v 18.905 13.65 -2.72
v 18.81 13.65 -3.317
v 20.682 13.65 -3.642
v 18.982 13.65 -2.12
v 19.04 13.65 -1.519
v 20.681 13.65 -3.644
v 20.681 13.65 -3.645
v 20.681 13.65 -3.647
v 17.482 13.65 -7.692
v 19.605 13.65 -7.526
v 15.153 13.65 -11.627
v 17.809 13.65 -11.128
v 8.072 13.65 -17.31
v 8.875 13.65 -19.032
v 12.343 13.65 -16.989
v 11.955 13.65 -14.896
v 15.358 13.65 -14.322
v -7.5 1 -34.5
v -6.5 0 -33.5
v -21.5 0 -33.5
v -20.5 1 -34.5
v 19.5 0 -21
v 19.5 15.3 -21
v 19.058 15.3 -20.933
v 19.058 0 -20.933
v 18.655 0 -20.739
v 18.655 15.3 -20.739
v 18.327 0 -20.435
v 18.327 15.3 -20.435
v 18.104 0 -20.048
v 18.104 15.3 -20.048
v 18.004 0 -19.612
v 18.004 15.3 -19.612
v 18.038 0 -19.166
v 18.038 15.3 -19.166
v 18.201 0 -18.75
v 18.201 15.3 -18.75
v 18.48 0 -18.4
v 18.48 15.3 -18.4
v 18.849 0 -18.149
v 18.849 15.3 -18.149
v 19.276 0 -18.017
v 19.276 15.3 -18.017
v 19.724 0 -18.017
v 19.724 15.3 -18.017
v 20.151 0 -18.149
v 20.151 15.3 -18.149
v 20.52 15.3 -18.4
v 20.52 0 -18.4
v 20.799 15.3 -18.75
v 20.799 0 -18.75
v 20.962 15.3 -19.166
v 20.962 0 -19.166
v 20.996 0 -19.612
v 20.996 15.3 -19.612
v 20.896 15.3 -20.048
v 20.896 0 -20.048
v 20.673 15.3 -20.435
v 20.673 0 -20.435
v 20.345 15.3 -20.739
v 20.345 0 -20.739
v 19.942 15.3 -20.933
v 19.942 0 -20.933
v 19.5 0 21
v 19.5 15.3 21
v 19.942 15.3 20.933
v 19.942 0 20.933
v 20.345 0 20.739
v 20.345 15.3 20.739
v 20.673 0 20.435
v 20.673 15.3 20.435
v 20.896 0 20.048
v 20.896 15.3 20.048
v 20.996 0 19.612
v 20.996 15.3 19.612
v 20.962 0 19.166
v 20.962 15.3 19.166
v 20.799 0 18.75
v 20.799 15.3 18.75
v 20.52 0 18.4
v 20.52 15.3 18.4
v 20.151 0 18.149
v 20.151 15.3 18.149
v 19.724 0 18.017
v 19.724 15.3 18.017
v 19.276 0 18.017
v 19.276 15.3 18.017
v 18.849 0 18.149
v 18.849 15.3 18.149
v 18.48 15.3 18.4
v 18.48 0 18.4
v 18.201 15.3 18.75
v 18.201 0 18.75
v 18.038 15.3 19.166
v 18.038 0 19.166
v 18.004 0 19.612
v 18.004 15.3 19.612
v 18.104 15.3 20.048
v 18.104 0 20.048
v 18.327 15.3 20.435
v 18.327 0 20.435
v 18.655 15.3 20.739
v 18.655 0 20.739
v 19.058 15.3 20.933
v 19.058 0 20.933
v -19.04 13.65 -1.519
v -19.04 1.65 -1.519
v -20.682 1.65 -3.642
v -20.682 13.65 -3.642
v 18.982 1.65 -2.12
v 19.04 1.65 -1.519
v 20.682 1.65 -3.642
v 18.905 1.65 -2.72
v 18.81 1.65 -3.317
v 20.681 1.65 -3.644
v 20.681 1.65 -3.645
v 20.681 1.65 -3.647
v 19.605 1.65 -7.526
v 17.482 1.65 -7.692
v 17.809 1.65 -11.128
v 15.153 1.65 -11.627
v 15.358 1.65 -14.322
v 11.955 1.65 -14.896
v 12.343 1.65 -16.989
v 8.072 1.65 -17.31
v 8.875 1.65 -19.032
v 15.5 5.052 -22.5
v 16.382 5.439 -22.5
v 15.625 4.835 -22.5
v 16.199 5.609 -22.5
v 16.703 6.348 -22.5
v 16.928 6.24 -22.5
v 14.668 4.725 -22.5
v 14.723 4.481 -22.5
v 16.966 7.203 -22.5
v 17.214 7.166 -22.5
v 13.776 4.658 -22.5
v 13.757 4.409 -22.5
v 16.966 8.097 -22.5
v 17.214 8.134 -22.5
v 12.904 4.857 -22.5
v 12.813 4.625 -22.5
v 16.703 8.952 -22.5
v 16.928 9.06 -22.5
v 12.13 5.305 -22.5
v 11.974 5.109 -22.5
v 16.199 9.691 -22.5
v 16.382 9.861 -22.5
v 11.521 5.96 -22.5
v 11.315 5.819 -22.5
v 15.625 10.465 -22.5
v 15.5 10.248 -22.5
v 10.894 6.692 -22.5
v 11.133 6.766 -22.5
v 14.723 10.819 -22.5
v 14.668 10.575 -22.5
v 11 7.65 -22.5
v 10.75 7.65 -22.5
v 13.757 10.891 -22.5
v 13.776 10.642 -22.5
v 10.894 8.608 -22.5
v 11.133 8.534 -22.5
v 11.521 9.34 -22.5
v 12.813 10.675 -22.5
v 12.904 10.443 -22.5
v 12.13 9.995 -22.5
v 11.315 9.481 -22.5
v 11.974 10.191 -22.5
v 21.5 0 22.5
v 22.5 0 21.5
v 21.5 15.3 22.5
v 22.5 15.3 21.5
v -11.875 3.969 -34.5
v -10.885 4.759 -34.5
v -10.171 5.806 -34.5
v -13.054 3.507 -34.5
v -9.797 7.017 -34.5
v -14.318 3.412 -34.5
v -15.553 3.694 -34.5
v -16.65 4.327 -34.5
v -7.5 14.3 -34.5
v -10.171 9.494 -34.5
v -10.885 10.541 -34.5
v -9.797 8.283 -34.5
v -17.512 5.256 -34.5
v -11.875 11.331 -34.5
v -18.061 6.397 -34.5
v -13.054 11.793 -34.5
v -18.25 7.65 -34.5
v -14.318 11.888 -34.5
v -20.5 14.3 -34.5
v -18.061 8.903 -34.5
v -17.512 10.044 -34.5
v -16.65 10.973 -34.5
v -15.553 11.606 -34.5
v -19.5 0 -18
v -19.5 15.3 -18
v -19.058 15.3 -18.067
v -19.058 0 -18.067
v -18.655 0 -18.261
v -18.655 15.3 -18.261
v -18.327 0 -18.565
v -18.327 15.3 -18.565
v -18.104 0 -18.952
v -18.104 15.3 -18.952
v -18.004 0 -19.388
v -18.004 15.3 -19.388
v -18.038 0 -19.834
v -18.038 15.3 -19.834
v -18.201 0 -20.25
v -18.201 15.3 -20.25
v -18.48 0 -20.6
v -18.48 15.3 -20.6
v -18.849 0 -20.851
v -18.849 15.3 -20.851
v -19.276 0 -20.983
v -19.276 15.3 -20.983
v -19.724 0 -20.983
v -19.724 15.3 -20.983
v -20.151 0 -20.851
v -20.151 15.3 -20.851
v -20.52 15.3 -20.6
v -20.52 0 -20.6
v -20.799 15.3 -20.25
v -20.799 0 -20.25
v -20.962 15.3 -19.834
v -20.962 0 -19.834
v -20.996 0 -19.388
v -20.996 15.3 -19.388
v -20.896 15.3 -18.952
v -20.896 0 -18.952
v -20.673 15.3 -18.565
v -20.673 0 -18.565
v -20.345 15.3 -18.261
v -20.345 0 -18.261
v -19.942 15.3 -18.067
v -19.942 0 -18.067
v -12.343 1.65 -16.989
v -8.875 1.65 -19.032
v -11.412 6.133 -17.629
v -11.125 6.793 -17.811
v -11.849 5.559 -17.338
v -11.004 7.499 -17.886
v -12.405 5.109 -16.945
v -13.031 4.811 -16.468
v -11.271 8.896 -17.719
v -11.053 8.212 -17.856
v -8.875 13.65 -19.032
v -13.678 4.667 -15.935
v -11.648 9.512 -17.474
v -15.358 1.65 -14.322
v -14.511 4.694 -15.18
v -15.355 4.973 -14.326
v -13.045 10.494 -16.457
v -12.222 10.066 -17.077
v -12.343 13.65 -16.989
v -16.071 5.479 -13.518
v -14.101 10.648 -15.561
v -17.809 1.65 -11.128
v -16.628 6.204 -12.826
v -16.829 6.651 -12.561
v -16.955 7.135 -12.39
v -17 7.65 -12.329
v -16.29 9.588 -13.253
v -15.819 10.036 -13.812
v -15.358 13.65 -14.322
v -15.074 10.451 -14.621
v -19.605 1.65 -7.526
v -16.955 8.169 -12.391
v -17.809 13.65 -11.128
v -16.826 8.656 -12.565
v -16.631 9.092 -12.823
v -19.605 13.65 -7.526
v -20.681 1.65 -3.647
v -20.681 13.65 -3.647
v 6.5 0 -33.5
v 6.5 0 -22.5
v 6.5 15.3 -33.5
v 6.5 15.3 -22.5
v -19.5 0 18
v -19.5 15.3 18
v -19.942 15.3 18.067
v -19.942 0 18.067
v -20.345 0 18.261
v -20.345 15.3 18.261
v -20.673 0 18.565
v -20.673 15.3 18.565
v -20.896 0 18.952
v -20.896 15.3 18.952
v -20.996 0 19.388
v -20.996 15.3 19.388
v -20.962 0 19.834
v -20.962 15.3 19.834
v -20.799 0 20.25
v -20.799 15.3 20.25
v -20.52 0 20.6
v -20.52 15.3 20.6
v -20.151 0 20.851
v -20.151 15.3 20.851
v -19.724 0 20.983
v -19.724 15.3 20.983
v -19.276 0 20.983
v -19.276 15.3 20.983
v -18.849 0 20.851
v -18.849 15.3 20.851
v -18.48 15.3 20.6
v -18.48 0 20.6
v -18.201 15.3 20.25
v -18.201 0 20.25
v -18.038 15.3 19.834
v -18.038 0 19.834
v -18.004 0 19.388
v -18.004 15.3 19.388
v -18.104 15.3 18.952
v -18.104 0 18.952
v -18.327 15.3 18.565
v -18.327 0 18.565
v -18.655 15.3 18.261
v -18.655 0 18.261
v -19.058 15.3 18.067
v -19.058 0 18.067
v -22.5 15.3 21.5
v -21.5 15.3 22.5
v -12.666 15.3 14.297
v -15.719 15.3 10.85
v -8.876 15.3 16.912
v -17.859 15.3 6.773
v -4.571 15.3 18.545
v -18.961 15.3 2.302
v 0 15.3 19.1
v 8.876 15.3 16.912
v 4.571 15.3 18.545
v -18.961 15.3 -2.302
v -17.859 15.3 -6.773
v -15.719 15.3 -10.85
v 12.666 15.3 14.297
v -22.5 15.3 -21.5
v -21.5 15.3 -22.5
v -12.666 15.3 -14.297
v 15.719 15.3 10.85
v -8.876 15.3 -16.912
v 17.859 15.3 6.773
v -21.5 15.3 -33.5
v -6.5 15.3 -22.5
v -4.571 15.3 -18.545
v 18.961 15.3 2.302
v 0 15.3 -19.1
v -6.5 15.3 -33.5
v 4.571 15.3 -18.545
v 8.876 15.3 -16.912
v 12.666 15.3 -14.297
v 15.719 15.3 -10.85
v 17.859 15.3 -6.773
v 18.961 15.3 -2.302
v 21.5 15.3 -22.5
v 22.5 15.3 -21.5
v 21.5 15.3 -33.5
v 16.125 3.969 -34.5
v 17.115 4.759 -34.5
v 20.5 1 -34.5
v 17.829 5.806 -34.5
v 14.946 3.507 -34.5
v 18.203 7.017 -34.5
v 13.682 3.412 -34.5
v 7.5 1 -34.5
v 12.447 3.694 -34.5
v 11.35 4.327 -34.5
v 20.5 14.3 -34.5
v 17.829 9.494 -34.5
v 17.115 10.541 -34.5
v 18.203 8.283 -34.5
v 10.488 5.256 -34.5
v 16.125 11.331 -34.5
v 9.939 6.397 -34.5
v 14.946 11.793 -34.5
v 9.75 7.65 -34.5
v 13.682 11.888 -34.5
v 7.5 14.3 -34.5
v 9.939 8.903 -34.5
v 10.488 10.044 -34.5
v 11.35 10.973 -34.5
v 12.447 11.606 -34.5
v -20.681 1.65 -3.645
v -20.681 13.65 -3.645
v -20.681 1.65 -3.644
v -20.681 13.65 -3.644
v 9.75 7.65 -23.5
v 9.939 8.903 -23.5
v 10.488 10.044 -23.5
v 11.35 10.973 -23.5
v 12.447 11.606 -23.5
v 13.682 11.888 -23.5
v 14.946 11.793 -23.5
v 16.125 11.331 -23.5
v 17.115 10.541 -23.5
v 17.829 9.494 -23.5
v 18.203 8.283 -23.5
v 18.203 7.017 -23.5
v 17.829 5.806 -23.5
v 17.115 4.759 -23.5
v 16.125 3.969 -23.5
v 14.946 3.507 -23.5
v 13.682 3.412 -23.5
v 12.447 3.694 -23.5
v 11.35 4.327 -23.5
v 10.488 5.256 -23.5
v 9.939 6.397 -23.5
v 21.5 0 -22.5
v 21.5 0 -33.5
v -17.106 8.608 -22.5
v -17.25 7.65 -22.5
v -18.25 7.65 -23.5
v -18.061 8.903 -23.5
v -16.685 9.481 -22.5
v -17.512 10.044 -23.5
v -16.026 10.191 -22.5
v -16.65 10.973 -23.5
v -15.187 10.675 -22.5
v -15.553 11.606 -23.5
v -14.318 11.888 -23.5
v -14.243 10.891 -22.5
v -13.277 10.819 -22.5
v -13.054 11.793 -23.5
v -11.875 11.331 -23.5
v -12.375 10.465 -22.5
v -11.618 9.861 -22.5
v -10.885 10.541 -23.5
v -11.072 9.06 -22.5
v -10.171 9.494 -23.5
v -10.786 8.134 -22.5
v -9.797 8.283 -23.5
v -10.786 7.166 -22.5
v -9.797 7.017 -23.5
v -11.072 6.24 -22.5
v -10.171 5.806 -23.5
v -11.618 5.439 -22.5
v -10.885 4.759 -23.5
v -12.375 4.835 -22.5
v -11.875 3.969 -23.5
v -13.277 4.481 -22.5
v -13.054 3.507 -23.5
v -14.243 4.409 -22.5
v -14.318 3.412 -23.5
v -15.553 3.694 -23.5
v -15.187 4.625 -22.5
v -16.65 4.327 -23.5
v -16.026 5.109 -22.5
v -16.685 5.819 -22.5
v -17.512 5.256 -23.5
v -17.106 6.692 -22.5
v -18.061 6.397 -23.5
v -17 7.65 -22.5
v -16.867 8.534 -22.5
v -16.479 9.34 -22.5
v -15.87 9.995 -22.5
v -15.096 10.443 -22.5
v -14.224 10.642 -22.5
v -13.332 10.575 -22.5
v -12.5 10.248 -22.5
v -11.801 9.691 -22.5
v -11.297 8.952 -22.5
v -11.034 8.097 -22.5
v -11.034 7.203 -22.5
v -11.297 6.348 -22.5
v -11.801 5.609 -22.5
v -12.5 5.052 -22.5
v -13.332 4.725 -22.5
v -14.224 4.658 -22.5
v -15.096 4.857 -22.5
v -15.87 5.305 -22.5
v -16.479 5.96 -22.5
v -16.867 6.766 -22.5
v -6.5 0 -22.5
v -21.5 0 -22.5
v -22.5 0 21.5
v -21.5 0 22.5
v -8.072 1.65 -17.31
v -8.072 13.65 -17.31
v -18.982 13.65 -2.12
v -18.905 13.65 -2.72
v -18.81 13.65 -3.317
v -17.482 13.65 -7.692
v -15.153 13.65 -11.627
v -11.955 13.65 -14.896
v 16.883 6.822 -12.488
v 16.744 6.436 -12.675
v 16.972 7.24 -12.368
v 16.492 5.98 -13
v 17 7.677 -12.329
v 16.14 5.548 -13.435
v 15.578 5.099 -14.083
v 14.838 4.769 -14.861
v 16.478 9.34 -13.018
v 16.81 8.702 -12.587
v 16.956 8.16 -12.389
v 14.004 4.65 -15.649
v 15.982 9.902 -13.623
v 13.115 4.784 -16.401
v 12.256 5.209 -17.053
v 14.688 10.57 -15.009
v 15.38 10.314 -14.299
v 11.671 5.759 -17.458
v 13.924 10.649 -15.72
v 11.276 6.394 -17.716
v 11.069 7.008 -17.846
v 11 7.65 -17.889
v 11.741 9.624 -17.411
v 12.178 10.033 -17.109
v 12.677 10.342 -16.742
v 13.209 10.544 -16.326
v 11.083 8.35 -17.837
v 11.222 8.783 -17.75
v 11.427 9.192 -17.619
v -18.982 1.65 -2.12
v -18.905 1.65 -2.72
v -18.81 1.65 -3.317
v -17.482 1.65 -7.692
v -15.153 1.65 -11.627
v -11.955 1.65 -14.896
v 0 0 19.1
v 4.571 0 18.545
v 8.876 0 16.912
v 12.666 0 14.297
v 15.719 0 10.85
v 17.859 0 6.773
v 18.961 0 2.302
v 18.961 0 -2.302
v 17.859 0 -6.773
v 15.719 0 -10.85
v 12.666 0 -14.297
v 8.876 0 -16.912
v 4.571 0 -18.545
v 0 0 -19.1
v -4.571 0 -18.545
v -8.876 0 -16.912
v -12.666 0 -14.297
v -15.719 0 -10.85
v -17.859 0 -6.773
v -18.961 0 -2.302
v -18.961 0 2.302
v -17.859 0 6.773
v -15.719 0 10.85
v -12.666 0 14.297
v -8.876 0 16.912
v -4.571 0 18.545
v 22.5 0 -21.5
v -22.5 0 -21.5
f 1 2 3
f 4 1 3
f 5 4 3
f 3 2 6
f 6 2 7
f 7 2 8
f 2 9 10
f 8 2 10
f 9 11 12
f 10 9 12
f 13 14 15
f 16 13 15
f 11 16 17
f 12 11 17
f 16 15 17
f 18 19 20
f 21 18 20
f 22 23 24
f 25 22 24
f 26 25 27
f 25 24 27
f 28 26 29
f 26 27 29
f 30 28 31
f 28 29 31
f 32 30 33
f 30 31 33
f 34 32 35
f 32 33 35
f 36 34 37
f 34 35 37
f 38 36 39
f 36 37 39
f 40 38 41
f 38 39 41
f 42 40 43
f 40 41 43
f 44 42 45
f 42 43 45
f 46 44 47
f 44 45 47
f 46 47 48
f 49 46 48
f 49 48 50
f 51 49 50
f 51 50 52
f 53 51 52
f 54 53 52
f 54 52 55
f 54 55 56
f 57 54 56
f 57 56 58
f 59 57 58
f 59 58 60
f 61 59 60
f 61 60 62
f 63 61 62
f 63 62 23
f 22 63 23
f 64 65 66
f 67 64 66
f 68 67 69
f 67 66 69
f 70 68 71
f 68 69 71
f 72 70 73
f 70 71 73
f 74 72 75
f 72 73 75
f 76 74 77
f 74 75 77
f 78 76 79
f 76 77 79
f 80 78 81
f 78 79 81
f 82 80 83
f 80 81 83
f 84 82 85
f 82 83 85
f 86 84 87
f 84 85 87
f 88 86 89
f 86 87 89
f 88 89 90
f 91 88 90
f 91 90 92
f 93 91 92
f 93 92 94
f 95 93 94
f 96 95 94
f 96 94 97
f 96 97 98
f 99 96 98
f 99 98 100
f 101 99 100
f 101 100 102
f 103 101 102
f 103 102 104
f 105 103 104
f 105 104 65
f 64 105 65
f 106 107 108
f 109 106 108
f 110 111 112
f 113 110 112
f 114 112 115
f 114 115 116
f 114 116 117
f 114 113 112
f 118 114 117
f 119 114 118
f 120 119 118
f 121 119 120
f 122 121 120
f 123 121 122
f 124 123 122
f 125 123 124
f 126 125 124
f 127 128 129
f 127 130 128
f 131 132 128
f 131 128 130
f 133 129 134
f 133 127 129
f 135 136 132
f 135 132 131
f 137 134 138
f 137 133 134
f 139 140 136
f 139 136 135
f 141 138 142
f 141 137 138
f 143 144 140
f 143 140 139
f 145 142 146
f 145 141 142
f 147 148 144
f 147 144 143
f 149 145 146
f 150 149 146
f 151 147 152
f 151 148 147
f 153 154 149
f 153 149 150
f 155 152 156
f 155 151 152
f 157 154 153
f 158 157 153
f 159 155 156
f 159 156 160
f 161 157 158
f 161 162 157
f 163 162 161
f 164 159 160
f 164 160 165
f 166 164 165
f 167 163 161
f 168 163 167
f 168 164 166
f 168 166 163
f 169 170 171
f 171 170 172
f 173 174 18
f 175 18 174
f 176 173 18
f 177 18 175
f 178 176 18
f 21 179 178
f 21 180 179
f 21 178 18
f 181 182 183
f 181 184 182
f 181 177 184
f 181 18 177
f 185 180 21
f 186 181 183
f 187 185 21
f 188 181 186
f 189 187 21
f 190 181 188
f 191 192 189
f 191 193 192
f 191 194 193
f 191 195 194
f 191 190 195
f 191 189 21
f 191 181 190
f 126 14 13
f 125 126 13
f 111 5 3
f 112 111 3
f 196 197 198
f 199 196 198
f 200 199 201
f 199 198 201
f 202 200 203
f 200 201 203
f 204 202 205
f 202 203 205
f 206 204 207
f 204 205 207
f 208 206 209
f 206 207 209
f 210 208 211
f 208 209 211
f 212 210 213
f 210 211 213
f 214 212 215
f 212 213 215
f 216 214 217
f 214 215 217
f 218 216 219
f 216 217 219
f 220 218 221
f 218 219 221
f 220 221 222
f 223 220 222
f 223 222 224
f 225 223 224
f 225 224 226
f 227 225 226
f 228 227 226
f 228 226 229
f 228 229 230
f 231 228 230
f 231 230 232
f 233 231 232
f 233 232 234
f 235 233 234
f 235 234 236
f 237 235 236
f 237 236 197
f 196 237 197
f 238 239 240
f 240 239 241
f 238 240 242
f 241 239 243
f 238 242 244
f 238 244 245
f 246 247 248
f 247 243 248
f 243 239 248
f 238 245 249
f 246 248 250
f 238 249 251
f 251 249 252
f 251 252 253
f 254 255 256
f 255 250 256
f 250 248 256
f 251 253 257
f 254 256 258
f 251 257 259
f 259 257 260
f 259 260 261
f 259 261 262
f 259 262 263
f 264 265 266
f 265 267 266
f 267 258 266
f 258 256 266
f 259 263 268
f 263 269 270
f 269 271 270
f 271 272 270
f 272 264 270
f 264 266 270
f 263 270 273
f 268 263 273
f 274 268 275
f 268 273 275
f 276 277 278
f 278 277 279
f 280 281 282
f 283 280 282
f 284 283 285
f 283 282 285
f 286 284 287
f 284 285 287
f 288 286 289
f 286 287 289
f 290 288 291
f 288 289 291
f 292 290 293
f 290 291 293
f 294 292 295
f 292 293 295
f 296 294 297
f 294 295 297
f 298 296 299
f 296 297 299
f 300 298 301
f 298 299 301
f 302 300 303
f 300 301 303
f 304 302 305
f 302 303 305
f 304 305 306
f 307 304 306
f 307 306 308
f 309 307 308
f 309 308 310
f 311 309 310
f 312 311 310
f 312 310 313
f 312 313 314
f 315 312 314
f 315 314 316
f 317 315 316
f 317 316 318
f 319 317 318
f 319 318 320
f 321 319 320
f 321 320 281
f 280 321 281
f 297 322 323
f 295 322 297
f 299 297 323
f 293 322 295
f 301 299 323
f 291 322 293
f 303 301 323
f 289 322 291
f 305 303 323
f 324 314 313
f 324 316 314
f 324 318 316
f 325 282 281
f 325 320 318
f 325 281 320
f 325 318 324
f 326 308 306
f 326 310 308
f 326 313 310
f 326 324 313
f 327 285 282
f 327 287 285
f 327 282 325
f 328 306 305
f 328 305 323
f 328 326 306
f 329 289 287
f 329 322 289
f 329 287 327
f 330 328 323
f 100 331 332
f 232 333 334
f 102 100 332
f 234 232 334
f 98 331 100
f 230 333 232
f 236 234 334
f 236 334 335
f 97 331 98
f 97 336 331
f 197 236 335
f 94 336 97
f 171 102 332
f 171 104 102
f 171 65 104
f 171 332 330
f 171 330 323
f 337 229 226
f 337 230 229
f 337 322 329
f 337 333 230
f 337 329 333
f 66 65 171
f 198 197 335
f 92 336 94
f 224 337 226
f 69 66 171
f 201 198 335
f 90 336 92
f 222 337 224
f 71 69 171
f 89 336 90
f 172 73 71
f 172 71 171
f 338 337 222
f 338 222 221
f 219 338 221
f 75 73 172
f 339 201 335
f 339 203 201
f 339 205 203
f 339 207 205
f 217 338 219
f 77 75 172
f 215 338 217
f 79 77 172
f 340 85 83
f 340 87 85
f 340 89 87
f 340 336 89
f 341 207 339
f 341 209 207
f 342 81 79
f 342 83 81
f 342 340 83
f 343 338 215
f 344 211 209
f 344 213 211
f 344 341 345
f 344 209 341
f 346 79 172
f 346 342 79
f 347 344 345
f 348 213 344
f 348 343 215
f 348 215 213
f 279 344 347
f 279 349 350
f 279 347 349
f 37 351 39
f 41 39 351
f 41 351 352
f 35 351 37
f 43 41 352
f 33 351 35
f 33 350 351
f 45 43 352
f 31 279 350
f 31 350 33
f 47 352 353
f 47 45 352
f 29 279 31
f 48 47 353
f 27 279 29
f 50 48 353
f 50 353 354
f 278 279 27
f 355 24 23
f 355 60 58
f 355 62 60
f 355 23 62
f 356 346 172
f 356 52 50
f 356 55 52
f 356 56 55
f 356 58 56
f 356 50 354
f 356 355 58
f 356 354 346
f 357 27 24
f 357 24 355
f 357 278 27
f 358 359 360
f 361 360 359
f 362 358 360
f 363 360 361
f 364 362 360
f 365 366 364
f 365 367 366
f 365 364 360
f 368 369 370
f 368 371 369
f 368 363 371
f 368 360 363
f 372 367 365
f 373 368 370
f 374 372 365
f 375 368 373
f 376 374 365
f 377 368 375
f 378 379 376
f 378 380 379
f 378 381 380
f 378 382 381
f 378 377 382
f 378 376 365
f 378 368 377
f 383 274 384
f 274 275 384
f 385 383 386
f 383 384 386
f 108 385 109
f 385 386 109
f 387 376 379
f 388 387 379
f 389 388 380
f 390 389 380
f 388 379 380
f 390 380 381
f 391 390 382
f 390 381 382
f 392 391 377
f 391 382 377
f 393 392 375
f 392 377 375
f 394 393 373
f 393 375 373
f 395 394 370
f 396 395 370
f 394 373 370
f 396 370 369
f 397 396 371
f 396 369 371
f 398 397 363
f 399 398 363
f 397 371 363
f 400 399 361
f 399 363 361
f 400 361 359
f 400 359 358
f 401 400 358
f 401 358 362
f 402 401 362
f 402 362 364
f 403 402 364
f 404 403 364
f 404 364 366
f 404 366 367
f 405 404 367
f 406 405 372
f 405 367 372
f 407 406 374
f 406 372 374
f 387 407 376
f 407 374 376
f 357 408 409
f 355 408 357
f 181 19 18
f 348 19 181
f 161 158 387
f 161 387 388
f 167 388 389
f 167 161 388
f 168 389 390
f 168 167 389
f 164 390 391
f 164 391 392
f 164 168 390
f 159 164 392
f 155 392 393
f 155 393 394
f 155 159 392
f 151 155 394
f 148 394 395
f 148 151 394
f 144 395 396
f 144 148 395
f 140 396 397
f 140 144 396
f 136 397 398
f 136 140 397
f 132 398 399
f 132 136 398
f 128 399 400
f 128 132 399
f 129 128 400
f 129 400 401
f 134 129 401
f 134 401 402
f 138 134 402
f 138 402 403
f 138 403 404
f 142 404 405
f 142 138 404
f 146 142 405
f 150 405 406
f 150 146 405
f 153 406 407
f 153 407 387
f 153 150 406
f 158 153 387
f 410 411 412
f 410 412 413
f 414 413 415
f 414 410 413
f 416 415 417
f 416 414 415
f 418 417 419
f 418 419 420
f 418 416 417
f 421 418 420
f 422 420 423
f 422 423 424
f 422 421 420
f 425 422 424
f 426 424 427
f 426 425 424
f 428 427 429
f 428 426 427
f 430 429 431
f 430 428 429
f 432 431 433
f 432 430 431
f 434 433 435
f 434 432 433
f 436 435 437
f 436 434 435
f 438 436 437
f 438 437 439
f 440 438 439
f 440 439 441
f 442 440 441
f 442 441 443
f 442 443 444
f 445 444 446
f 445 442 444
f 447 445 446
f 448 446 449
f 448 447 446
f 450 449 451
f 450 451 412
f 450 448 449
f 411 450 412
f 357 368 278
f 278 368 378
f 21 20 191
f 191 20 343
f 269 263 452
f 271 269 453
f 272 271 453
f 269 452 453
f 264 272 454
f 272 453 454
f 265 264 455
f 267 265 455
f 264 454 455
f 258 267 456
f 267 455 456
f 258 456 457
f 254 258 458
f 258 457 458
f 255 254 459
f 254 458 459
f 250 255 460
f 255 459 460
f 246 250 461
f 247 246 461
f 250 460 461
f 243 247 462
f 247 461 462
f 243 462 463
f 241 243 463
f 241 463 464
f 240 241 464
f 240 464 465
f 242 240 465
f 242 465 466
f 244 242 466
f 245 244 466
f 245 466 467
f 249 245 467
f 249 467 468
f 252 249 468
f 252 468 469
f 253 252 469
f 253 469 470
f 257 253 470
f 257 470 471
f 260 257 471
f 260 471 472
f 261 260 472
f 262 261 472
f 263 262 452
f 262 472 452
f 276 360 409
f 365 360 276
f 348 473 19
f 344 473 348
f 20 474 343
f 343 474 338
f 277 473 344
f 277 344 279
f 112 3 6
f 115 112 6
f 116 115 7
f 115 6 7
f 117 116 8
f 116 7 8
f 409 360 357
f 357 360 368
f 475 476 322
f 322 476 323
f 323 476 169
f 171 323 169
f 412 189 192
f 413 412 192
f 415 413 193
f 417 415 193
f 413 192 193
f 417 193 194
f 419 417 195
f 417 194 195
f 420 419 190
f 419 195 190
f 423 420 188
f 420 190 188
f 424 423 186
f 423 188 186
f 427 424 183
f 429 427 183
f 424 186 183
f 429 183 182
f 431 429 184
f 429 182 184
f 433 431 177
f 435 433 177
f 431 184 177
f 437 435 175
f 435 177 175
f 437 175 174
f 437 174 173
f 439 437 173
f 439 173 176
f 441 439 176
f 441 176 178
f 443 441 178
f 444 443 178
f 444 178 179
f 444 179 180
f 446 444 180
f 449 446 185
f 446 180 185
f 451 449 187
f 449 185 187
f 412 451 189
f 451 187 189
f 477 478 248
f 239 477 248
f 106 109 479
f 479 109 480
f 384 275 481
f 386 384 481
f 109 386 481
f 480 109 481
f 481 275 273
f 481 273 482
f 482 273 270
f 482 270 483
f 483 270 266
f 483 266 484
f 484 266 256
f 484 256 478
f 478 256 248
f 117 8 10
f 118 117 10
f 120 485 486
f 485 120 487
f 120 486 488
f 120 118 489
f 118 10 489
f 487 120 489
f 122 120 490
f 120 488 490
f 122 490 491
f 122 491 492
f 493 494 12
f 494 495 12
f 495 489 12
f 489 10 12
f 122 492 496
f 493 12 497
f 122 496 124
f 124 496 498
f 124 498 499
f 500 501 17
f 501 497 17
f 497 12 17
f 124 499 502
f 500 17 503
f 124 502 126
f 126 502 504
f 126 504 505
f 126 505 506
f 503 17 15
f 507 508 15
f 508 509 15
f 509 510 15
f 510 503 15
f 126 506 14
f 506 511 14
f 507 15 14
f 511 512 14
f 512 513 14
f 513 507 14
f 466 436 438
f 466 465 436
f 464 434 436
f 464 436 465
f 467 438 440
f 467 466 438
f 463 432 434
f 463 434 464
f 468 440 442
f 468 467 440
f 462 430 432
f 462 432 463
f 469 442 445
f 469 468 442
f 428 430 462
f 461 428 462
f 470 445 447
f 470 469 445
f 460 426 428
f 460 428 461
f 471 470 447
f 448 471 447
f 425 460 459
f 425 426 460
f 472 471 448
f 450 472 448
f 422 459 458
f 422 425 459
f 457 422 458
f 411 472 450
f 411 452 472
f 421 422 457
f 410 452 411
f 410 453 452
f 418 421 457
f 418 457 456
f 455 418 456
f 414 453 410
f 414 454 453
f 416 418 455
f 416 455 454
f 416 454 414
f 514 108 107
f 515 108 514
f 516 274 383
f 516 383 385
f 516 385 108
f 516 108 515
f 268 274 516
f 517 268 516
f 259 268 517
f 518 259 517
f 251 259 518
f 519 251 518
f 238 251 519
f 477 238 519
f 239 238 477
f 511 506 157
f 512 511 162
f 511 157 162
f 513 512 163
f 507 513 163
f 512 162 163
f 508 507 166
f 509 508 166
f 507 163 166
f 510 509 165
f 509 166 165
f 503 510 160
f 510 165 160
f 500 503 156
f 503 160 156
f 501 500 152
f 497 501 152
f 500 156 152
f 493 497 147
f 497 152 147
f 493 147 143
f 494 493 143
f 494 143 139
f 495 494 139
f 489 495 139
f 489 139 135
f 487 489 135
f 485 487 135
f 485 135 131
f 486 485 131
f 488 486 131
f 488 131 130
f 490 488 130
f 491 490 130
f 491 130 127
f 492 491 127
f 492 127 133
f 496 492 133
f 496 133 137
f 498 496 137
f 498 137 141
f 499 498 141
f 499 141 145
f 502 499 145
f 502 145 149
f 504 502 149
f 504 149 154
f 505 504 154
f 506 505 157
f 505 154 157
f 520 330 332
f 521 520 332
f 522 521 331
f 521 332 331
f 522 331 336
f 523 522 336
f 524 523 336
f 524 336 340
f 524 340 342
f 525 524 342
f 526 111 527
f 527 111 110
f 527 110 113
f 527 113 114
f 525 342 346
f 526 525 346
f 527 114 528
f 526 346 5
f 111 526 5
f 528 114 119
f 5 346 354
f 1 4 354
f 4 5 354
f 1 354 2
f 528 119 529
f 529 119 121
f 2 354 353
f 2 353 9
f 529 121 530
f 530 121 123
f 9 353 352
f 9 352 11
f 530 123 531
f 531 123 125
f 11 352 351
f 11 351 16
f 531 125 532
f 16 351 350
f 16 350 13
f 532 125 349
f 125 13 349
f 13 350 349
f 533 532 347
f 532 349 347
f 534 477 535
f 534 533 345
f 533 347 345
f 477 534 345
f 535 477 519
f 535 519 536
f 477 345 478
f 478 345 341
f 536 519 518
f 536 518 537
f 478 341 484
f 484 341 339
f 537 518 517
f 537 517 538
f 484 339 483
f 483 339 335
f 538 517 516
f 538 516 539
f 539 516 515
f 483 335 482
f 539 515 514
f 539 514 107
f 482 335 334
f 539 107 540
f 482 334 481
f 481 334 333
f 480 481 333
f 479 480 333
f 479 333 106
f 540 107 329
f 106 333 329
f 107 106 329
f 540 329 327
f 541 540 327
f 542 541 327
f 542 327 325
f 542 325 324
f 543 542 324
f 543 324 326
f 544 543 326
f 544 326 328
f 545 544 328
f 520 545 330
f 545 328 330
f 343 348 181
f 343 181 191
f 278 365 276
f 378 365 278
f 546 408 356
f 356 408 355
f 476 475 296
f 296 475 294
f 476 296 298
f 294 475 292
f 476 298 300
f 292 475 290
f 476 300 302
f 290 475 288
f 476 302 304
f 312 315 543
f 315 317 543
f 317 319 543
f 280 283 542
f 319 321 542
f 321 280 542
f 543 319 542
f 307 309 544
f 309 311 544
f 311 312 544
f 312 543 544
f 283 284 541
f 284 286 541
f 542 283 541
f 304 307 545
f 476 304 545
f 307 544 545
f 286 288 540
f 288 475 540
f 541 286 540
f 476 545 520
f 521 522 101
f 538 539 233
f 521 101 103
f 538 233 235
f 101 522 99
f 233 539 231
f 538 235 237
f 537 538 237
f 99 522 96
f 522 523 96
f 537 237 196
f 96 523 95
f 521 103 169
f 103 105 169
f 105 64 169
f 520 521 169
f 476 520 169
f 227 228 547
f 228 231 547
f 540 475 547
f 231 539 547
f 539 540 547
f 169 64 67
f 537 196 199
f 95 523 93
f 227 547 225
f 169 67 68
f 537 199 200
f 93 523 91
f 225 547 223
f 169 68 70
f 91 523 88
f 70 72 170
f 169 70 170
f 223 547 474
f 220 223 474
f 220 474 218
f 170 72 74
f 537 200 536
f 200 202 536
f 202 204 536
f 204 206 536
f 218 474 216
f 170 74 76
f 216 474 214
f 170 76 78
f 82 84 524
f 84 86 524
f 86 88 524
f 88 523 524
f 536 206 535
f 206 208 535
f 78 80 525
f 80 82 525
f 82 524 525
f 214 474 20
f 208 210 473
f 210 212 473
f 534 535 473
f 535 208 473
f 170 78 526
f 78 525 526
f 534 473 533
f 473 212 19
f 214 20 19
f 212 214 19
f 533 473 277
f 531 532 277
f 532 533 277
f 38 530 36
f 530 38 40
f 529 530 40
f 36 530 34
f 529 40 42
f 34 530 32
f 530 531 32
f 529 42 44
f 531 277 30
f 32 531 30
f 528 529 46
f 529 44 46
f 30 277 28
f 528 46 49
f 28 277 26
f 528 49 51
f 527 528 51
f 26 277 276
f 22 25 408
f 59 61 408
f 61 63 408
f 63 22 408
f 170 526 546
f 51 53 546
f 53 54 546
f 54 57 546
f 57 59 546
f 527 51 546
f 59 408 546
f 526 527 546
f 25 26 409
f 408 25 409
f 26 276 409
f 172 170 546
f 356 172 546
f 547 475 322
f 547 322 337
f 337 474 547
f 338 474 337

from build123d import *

# Parameters (mm, degrees)
SKETCH_1_W               = 45
SKETCH_1_H               = 45
EXTRUDE_1_DEPTH          = 15.3
SKETCH_2_R               = 19.1
CUT_EXTRUDE_1_DEPTH      = 36.307081443
SKETCH_5_W               = 15
SKETCH_5_H               = 15.3
EXTRUDE_2_DEPTH          = 12
SKETCH_6_R               = 3
CUT_EXTRUDE_4_DEPTH      = 35
SKETCH_7_R               = 1.5
CUT_EXTRUDE_5_DEPTH      = 44.938479832
CUT_EXTRUDE_6_DEPTH      = 6
CUT_EXTRUDE_6_DEPTH_BACK = 6
SKETCH_9_R               = 4.25
CUT_EXTRUDE_7_DEPTH      = 12
CHAMFER_2_SIZE           = 1
CHAMFER_3_SIZE           = 1
CHAMFER_4_SIZE           = 1


# Some blends are built 0.0001 mm under size
with BuildPart() as part:
    # 草图1 → 凸台-拉伸1 (new body)
    with BuildSketch(Plane(origin=(0, 0, 0), x_dir=(1, 0, 0), z_dir=(0, 1, 0))):
        Rectangle(SKETCH_1_W, SKETCH_1_H)
    extrude(amount=EXTRUDE_1_DEPTH)

    # 草图2 → 切除-拉伸1 (cut, through all)
    with BuildSketch(Plane(origin=(0, 15.3, 0), x_dir=(1, 0, 0), z_dir=(0, 1, 0))):
        with Locations(Location((0, 0, 0), (0, 0, 270))):
            Circle(SKETCH_2_R)
    extrude(amount=-CUT_EXTRUDE_1_DEPTH, mode=Mode.SUBTRACT)

    # 草图5 → 凸台-拉伸2 (add)
    with BuildSketch(Plane(origin=(0, 0, -22.5), x_dir=(-1, 0, 0), z_dir=(0, 0, -1))):
        with Locations((14, 7.65)):
            Rectangle(SKETCH_5_W, SKETCH_5_H)
        with Locations((-14, 7.65)):
            Rectangle(SKETCH_5_W, SKETCH_5_H)
    extrude(amount=EXTRUDE_2_DEPTH)

    # 草图6 → 切除-拉伸4 (cut)
    with BuildSketch(Plane(origin=(0, 0, -34.5), x_dir=(-1, 0, 0), z_dir=(0, 0, -1))):
        with Locations((-14, 7.65)):
            Circle(SKETCH_6_R)
        with Locations((14, 7.65)):
            Circle(SKETCH_6_R)
    extrude(amount=-CUT_EXTRUDE_4_DEPTH, mode=Mode.SUBTRACT)

    # 草图7 → 切除-拉伸5 (cut, through all)
    with BuildSketch(Plane(origin=(0, 15.3, 0), x_dir=(1, 0, 0), z_dir=(0, 1, 0))):
        with Locations(Location((-19.5, 19.5, 0), (0, 0, 270))):
            Circle(SKETCH_7_R)
        with Locations(Location((19.5, 19.5, 0), (0, 0, 90))):
            Circle(SKETCH_7_R)
        with Locations(Location((19.5, -19.5, 0), (0, 0, 270))):
            Circle(SKETCH_7_R)
        with Locations(Location((-19.5, -19.5, 0), (0, 0, 90))):
            Circle(SKETCH_7_R)
    extrude(amount=-CUT_EXTRUDE_5_DEPTH, mode=Mode.SUBTRACT)

    # 草图8 → 切除-拉伸6 (cut, two sides: drawn at the far end of the back side and taken through both)
    with BuildSketch(Plane(origin=(0, 7.65, 0), x_dir=(-1, 0, 0), z_dir=(0, -1, 0)).offset(-CUT_EXTRUDE_6_DEPTH_BACK)):
        with BuildLine():
            Line((-8.874983497, 19.032463528), (-8.072008799, 17.310478732))
            ThreePointArc((-8.072008799, 17.310478732), (-15.1530488, 11.627343294), (-18.809828083, 3.316680193))
            Line((-18.809828083, 3.316680193), (-20.680962813, 3.646611731))
            ThreePointArc((-20.680962813, 3.646611731), (-16.660420146, 12.783990009), (-8.874983497, 19.032463528))
        make_face()
        with BuildLine():
            Line((20.680962813, 3.646611731), (18.809828083, 3.316680193))
            ThreePointArc((18.809828083, 3.316680193), (15.1530488, 11.627343294), (8.072008799, 17.310478732))
            Line((8.072008799, 17.310478732), (8.874983497, 19.032463528))
            ThreePointArc((8.874983497, 19.032463528), (16.660420146, 12.783990009), (20.680962813, 3.646611731))
        make_face()
    extrude(amount=CUT_EXTRUDE_6_DEPTH + CUT_EXTRUDE_6_DEPTH_BACK, mode=Mode.SUBTRACT)

    # 草图9 → 切除-拉伸7 (cut)
    with BuildSketch(Plane(origin=(0, 0, -34.5), x_dir=(-1, 0, 0), z_dir=(0, 0, -1))):
        with Locations((-14, 7.65)):
            Circle(SKETCH_9_R)
        with Locations((14, 7.65)):
            Circle(SKETCH_9_R)
    extrude(amount=-CUT_EXTRUDE_7_DEPTH, mode=Mode.SUBTRACT)

    # 倒角1
    # the kernel refuses this chamfer: 2 mm, written as the material it takes off along each edge
    with BuildSketch(Plane(origin=(-18.809828083, 1.65, -3.316680193), x_dir=(-0.09666023054018325, 0, 0.9953174367165073), z_dir=(0, 1, 0))) as chamfer_1_piece_1_section:
        with BuildLine():
            Line((1.811638226, -0.054831322), (-0.147910468, -1.899248595))
            Line((-0.147910468, -1.899248595), (0, 0))
            ThreePointArc((0, 0), (0.933514183, -0.049753736), (1.811638226, -0.054831322))
        make_face()
    chamfer_1_piece_1 = extrude(amount=12, mode=Mode.PRIVATE)
    chamfer_1_piece_1 = chamfer_1_piece_1 & Plane(origin=(0, 7.65, 0), x_dir=(-0.42261826174070266, 0, -0.9063077870366485), z_dir=(0, 1, 0)) * Cylinder(21, 32, mode=Mode.PRIVATE)
    add(chamfer_1_piece_1, mode=Mode.SUBTRACT)
    with BuildSketch(Plane(origin=(18.809828083, 13.65, -3.316680193), x_dir=(0.09666023054018283, 0, 0.9953174367165073), z_dir=(0, -1, 0))) as chamfer_1_piece_2_section:
        with BuildLine():
            Line((1.811638226, -0.054831322), (-0.147910468, -1.899248595))
            Line((-0.147910468, -1.899248595), (0, 0))
            ThreePointArc((0, 0), (0.933514183, -0.049753736), (1.811638226, -0.054831322))
        make_face()
    chamfer_1_piece_2 = extrude(amount=12, mode=Mode.PRIVATE)
    chamfer_1_piece_2 = chamfer_1_piece_2 & Plane(origin=(0, 7.65, 0), x_dir=(0.9848077530122075, 0, -0.17364817766693397), z_dir=(0, 1, 0)) * Cylinder(21, 32, mode=Mode.PRIVATE)
    add(chamfer_1_piece_2, mode=Mode.SUBTRACT)

    # 倒角2
    chamfer_2_edges = [part.edges().sort_by_distance(p)[0] for p in [
        (22.5, 7.65, 22.5),
        (-22.5, 7.65, 22.5),
        (-22.5, 7.65, -22.5),
        (22.5, 7.65, -22.5),
    ]]
    chamfer(chamfer_2_edges, length=CHAMFER_2_SIZE - 0.0001)  # a hair under: the kernel refuses the full size

    # 倒角3
    chamfer_3_edges = [part.edges().sort_by_distance(p)[0] for p in [
        (18.25, 7.65, -22.5),
        (-9.75, 7.65, -22.5),
    ]]
    chamfer(chamfer_3_edges, length=CHAMFER_3_SIZE)

    # 倒角4
    chamfer_4_edges = [part.edges().sort_by_distance(p)[0] for p in [
        (6.5, 7.65, -34.5),
        (14, 15.3, -34.5),
        (21.5, 7.65, -34.5),
        (14, 0, -34.5),
        (-21.5, 7.65, -34.5),
        (-14, 15.3, -34.5),
        (-6.5, 7.65, -34.5),
        (-14, 0, -34.5),
    ]]
    chamfer(chamfer_4_edges, length=CHAMFER_4_SIZE)


solid = part.part
